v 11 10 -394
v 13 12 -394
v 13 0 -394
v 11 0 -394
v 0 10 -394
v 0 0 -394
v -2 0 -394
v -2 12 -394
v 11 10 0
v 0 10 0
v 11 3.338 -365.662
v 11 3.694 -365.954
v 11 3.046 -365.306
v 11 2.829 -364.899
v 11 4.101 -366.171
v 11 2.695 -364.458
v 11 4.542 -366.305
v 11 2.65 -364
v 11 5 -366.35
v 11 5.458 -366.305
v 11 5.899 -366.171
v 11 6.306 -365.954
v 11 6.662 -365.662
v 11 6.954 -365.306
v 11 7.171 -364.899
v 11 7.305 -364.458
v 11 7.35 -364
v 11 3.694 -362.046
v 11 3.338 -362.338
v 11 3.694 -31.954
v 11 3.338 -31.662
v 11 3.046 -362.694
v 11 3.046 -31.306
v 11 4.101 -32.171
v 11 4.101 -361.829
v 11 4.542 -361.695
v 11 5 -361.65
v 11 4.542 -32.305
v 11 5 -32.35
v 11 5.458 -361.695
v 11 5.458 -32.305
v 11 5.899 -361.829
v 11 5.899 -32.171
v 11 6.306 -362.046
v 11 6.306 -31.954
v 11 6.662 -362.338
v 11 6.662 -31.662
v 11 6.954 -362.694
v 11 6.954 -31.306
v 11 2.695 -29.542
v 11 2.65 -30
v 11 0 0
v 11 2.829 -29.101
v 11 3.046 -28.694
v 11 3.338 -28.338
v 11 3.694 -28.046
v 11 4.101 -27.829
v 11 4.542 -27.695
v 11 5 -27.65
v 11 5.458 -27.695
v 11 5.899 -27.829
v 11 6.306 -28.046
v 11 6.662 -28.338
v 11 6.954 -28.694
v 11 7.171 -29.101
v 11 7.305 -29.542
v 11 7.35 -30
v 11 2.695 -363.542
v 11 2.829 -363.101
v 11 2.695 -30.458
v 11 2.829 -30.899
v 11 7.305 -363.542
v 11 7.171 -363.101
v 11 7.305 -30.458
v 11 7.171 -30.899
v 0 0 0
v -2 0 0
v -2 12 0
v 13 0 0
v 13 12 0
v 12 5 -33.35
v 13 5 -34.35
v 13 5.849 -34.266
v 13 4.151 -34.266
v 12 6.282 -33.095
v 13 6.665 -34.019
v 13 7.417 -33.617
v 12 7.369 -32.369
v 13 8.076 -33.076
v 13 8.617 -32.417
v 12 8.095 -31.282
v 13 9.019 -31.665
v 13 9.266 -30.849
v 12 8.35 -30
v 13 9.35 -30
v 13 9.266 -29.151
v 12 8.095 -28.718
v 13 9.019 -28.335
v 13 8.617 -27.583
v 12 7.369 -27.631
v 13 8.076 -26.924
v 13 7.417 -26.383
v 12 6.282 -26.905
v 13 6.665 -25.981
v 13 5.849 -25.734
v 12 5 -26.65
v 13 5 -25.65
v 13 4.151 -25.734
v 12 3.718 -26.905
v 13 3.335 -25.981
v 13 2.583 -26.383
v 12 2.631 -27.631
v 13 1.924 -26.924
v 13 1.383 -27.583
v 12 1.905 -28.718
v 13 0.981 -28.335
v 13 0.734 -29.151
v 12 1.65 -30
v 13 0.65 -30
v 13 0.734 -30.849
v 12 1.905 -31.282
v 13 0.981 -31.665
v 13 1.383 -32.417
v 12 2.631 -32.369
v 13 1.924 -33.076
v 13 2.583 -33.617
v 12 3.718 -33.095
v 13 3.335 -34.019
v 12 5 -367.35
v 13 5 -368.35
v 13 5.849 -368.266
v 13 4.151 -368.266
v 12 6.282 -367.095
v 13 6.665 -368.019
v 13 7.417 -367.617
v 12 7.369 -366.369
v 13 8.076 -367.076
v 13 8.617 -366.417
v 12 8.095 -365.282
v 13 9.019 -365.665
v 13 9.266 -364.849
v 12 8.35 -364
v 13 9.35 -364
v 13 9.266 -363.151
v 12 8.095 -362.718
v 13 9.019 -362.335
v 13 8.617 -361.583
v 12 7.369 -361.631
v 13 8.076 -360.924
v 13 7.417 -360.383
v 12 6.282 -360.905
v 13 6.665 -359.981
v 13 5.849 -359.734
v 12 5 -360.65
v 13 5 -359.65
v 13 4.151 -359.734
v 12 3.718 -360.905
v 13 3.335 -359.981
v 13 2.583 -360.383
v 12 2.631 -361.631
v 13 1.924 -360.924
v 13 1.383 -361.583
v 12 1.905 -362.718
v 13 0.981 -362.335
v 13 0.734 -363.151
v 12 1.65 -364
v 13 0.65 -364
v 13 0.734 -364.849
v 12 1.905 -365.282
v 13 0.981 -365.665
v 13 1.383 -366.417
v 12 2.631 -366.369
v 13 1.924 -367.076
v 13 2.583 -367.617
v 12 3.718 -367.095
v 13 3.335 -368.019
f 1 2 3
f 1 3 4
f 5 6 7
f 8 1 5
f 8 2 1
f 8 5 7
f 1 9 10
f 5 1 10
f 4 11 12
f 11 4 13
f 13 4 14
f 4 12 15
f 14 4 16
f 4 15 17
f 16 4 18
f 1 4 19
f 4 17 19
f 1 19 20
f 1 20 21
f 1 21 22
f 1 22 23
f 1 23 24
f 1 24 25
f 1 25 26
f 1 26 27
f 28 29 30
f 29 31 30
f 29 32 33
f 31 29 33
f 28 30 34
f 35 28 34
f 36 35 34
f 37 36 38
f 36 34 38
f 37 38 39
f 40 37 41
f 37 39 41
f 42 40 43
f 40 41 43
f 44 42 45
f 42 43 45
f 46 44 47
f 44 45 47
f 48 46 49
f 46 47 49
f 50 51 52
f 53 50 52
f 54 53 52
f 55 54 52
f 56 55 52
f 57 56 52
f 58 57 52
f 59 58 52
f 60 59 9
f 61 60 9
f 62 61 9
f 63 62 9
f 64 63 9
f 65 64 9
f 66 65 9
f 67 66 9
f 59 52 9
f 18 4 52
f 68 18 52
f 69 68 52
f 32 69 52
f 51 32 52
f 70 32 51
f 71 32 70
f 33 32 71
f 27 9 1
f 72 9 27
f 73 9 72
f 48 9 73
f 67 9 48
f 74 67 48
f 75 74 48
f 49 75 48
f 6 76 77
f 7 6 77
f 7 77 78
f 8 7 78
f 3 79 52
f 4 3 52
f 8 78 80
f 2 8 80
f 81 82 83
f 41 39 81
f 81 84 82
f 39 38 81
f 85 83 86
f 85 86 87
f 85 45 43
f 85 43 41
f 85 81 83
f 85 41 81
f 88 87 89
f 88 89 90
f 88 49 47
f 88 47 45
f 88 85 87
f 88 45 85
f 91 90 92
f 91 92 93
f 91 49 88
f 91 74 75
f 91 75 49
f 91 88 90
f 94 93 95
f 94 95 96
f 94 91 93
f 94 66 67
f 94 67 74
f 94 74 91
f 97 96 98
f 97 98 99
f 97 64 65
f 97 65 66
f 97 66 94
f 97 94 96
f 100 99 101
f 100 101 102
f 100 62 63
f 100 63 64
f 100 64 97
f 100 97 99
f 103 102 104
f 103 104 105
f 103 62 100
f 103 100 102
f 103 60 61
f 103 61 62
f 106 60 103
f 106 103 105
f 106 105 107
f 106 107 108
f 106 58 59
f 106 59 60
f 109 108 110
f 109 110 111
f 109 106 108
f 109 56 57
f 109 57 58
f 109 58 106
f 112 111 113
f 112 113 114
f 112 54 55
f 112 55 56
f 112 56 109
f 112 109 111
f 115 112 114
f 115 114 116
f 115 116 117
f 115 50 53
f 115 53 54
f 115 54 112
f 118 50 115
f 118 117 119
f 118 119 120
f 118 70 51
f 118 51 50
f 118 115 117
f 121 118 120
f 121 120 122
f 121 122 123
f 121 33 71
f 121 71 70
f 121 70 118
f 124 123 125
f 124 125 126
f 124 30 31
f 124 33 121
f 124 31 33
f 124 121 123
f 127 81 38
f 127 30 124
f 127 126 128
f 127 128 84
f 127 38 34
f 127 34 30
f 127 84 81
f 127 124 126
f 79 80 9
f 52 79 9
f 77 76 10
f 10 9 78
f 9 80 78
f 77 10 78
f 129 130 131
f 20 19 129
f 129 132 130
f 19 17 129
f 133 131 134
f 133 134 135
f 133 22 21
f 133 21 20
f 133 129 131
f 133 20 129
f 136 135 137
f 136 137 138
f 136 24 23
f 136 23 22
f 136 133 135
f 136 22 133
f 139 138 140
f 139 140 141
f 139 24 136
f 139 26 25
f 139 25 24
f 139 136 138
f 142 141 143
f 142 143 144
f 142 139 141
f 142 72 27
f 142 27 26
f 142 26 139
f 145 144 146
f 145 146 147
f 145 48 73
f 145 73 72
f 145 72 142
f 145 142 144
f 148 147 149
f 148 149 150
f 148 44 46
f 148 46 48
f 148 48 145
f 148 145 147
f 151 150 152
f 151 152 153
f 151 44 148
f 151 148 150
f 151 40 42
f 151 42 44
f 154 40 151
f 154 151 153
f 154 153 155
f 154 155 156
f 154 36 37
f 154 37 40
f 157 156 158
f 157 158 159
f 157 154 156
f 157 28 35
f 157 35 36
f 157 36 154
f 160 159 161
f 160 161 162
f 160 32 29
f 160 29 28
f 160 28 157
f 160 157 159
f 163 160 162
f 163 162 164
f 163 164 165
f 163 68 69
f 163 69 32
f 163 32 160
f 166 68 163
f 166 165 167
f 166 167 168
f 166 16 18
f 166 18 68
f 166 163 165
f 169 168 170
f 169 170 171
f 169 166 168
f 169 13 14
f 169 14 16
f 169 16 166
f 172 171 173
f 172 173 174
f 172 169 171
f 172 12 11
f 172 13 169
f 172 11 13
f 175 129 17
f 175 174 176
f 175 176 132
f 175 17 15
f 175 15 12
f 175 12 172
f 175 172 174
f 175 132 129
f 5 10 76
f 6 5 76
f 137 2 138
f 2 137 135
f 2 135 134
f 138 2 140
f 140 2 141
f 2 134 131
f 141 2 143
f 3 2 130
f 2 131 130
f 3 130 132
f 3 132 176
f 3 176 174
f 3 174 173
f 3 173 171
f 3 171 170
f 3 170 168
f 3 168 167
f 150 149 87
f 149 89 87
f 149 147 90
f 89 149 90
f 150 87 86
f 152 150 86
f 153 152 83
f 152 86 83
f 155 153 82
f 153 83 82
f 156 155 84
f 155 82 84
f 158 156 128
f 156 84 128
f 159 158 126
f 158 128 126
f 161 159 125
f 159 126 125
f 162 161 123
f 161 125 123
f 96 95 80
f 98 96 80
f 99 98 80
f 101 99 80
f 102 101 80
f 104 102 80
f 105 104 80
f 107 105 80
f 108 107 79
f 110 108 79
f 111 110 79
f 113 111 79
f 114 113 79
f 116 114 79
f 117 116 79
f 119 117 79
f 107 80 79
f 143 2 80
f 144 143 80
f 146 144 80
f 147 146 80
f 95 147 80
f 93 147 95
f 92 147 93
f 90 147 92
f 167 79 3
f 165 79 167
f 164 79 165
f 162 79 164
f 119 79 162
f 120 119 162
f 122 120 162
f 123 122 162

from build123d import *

# Parameters (mm, degrees)
SM_BASE_FLANGE_2_DEPTH = 394
SKETCH_7_R             = 2.3
CUT_EXTRUDE_1_DEPTH    = 2
CHAMFER_1_SIZE         = 2.05


# Sheet-metal steps are written as plain solids
with BuildPart() as part:
    # Эскиз6 → Базовая кромка2 (new body)
    with BuildSketch(Plane.XY):
        Polygon((0, 0), (-2, 0), (-2, 12), (13, 12), (13, 0), (11, 0), (11, 10), (0, 10), align=None)
    extrude(amount=-SM_BASE_FLANGE_2_DEPTH)

    # Эскиз7 → Вырез-Вытянуть1 (cut)
    with BuildSketch(Plane(origin=(13, 0, 0), x_dir=(0, 0, -1), z_dir=(1, 0, 0))):
        with Locations((30, 5)):
            Circle(SKETCH_7_R)
        with Locations((364, 5)):
            Circle(SKETCH_7_R)
    extrude(amount=-CUT_EXTRUDE_1_DEPTH, mode=Mode.SUBTRACT)

    # Фаска1
    # the kernel refuses this chamfer: 2.05 mm, written as the material it takes off along each edge
    with BuildSketch(Plane(origin=(13, 5, -364), x_dir=(0, 0, -1), z_dir=(0, -1, 0))) as chamfer_1_piece_1:
        Polygon((2.3 + CHAMFER_1_SIZE, 0), (2.3, -CHAMFER_1_SIZE), (2.3, 0), align=None)
    revolve(axis=Axis((13, 5, -364), (1, 0, 0)), mode=Mode.SUBTRACT)
    with BuildSketch(Plane(origin=(13, 5, -30), x_dir=(0, 0, -1), z_dir=(0, -1, 0))) as chamfer_1_piece_2:
        Polygon((2.3 + CHAMFER_1_SIZE, 0), (2.3, -CHAMFER_1_SIZE), (2.3, 0), align=None)
    revolve(axis=Axis((13, 5, -30), (1, 0, 0)), mode=Mode.SUBTRACT)


solid = part.part
